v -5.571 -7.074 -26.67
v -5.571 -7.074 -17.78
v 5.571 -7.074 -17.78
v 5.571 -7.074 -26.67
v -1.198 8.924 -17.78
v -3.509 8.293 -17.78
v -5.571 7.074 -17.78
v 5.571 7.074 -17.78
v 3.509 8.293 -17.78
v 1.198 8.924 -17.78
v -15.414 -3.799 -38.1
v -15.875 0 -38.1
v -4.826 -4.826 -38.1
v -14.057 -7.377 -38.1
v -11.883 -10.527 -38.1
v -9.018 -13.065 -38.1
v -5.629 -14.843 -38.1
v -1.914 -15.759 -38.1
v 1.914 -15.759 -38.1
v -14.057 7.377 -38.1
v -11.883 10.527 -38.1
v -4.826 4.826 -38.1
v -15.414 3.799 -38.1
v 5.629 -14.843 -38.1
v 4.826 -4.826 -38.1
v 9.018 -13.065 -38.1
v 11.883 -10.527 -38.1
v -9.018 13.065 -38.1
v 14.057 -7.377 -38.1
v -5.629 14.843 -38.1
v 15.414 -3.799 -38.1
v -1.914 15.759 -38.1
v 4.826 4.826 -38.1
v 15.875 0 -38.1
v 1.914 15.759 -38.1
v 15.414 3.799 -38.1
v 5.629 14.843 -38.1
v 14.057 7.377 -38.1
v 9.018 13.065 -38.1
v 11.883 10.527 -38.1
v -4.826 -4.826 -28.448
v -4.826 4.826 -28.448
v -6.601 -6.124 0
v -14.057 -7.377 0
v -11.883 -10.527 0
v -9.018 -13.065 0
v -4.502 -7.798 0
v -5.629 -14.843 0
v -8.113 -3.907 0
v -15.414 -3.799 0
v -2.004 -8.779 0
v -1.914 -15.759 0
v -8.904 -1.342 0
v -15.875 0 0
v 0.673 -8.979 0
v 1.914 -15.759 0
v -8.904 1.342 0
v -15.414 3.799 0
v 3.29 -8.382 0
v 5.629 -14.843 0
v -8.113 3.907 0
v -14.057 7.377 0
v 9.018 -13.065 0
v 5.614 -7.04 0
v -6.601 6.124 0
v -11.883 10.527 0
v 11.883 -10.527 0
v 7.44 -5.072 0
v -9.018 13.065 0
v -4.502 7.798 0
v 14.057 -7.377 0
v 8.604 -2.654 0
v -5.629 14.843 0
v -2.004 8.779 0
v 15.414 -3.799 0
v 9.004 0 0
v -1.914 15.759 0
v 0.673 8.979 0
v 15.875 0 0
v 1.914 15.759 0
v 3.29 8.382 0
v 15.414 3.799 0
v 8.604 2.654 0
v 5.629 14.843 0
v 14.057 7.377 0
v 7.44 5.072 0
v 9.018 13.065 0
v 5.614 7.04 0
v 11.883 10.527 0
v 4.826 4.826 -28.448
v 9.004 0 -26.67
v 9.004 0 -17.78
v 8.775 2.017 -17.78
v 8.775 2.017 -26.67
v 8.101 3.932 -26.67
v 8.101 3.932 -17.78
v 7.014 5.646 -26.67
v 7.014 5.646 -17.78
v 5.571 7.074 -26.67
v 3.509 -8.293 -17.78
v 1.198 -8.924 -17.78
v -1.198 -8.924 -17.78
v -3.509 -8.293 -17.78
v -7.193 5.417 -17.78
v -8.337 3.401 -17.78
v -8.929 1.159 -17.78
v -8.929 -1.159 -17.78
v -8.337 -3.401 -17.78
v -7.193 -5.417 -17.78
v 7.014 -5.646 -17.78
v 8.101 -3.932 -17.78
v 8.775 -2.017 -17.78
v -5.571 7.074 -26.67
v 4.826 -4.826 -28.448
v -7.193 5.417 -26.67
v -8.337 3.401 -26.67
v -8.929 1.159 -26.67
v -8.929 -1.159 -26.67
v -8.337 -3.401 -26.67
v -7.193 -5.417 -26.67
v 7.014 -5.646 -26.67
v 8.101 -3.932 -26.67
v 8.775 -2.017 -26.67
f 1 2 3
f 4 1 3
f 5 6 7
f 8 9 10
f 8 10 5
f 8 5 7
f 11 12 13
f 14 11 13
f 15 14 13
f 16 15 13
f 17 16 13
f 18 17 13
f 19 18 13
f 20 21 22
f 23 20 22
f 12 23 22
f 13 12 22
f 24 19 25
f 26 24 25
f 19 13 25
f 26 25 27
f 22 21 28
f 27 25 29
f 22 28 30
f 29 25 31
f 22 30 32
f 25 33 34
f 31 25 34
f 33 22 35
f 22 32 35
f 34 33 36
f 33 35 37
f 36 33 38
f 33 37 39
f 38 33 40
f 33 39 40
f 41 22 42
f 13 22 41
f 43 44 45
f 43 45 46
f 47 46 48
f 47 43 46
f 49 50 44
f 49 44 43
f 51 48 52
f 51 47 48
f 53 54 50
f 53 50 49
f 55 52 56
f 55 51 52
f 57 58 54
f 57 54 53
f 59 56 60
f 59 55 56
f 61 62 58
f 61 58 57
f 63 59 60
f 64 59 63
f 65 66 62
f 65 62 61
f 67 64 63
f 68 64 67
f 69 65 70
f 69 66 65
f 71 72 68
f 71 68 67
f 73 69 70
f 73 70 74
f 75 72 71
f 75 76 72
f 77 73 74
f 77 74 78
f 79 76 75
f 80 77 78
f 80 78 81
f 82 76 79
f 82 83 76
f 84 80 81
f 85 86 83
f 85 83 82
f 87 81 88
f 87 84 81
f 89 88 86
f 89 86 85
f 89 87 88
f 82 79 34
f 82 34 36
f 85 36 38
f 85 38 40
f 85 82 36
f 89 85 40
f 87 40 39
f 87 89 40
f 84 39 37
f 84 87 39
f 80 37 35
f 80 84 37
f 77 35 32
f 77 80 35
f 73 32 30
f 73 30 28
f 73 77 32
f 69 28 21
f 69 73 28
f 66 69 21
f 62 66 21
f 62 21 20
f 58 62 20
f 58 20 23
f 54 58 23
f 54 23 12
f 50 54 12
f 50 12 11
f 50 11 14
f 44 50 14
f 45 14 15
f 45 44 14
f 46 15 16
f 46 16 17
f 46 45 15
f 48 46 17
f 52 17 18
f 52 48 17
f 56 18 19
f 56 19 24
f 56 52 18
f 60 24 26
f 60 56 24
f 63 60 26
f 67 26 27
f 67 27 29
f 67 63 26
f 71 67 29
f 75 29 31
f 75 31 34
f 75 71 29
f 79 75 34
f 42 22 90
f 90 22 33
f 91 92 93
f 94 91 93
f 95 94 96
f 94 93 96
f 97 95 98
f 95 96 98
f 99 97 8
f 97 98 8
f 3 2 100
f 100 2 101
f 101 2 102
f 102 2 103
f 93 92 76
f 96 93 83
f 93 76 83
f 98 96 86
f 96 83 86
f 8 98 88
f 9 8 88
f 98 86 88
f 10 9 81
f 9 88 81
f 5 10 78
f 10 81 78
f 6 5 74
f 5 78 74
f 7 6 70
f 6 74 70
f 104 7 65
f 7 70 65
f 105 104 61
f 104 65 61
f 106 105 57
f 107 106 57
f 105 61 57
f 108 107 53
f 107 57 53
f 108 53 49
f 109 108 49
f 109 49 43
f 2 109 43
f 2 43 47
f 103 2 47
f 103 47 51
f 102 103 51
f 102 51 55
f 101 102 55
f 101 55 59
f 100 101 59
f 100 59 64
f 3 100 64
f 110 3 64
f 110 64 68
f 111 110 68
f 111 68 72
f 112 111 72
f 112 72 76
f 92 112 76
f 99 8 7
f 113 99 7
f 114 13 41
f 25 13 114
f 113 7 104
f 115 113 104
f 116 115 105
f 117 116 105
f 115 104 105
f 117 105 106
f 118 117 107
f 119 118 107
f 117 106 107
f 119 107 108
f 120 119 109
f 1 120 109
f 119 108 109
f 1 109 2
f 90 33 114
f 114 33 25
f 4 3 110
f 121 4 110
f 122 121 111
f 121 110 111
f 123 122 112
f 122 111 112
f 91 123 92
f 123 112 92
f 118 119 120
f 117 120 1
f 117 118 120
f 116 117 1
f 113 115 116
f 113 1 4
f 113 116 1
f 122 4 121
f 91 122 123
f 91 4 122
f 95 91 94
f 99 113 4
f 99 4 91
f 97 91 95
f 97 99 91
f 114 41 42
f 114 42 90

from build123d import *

# Parameters (mm, degrees)
F0_R     = 15.875
F1_DEPTH = 38.1
F2_W     = 9.652
F2_H     = 9.652
F3_DEPTH = 9.652
F4_R     = 9.0043
F5_DEPTH = 17.78
F7_DEPTH = 8.89


with BuildPart() as f1:
    # F0 (on Top) → F1 (new body)
    with BuildSketch(Plane.XY):
        Circle(F0_R)
    extrude(amount=-F1_DEPTH)

    # F2 (on face) → F3 (cut)
    with BuildSketch(Plane(origin=(0, 0, -38.1), x_dir=(1, 0, 0), z_dir=(0, 0, -1))):
        Rectangle(F2_W, F2_H)
    extrude(amount=-F3_DEPTH, mode=Mode.SUBTRACT)

    # F4 (on face) → F5 (cut)
    with BuildSketch(Plane.XY):
        Circle(F4_R)
    extrude(amount=-F5_DEPTH, mode=Mode.SUBTRACT)

    # F6 (on face) → F7 (cut)
    with BuildSketch(Plane.XY.offset(-17.78)):
        with BuildLine():
            Line((5.571118, 7.0739), (-5.571118, 7.0739))
            ThreePointArc((-5.571118, 7.0739), (-9.0043, 0), (-5.571118, -7.0739))
            Line((-5.571118, -7.0739), (5.571118, -7.0739))
            ThreePointArc((5.571118, -7.0739), (8.100662, -3.931501), (9.0043, 0))
            ThreePointArc((9.0043, 0), (8.100662, 3.931501), (5.571118, 7.0739))
        make_face()
    extrude(amount=-F7_DEPTH, mode=Mode.SUBTRACT)


solid = f1.part
